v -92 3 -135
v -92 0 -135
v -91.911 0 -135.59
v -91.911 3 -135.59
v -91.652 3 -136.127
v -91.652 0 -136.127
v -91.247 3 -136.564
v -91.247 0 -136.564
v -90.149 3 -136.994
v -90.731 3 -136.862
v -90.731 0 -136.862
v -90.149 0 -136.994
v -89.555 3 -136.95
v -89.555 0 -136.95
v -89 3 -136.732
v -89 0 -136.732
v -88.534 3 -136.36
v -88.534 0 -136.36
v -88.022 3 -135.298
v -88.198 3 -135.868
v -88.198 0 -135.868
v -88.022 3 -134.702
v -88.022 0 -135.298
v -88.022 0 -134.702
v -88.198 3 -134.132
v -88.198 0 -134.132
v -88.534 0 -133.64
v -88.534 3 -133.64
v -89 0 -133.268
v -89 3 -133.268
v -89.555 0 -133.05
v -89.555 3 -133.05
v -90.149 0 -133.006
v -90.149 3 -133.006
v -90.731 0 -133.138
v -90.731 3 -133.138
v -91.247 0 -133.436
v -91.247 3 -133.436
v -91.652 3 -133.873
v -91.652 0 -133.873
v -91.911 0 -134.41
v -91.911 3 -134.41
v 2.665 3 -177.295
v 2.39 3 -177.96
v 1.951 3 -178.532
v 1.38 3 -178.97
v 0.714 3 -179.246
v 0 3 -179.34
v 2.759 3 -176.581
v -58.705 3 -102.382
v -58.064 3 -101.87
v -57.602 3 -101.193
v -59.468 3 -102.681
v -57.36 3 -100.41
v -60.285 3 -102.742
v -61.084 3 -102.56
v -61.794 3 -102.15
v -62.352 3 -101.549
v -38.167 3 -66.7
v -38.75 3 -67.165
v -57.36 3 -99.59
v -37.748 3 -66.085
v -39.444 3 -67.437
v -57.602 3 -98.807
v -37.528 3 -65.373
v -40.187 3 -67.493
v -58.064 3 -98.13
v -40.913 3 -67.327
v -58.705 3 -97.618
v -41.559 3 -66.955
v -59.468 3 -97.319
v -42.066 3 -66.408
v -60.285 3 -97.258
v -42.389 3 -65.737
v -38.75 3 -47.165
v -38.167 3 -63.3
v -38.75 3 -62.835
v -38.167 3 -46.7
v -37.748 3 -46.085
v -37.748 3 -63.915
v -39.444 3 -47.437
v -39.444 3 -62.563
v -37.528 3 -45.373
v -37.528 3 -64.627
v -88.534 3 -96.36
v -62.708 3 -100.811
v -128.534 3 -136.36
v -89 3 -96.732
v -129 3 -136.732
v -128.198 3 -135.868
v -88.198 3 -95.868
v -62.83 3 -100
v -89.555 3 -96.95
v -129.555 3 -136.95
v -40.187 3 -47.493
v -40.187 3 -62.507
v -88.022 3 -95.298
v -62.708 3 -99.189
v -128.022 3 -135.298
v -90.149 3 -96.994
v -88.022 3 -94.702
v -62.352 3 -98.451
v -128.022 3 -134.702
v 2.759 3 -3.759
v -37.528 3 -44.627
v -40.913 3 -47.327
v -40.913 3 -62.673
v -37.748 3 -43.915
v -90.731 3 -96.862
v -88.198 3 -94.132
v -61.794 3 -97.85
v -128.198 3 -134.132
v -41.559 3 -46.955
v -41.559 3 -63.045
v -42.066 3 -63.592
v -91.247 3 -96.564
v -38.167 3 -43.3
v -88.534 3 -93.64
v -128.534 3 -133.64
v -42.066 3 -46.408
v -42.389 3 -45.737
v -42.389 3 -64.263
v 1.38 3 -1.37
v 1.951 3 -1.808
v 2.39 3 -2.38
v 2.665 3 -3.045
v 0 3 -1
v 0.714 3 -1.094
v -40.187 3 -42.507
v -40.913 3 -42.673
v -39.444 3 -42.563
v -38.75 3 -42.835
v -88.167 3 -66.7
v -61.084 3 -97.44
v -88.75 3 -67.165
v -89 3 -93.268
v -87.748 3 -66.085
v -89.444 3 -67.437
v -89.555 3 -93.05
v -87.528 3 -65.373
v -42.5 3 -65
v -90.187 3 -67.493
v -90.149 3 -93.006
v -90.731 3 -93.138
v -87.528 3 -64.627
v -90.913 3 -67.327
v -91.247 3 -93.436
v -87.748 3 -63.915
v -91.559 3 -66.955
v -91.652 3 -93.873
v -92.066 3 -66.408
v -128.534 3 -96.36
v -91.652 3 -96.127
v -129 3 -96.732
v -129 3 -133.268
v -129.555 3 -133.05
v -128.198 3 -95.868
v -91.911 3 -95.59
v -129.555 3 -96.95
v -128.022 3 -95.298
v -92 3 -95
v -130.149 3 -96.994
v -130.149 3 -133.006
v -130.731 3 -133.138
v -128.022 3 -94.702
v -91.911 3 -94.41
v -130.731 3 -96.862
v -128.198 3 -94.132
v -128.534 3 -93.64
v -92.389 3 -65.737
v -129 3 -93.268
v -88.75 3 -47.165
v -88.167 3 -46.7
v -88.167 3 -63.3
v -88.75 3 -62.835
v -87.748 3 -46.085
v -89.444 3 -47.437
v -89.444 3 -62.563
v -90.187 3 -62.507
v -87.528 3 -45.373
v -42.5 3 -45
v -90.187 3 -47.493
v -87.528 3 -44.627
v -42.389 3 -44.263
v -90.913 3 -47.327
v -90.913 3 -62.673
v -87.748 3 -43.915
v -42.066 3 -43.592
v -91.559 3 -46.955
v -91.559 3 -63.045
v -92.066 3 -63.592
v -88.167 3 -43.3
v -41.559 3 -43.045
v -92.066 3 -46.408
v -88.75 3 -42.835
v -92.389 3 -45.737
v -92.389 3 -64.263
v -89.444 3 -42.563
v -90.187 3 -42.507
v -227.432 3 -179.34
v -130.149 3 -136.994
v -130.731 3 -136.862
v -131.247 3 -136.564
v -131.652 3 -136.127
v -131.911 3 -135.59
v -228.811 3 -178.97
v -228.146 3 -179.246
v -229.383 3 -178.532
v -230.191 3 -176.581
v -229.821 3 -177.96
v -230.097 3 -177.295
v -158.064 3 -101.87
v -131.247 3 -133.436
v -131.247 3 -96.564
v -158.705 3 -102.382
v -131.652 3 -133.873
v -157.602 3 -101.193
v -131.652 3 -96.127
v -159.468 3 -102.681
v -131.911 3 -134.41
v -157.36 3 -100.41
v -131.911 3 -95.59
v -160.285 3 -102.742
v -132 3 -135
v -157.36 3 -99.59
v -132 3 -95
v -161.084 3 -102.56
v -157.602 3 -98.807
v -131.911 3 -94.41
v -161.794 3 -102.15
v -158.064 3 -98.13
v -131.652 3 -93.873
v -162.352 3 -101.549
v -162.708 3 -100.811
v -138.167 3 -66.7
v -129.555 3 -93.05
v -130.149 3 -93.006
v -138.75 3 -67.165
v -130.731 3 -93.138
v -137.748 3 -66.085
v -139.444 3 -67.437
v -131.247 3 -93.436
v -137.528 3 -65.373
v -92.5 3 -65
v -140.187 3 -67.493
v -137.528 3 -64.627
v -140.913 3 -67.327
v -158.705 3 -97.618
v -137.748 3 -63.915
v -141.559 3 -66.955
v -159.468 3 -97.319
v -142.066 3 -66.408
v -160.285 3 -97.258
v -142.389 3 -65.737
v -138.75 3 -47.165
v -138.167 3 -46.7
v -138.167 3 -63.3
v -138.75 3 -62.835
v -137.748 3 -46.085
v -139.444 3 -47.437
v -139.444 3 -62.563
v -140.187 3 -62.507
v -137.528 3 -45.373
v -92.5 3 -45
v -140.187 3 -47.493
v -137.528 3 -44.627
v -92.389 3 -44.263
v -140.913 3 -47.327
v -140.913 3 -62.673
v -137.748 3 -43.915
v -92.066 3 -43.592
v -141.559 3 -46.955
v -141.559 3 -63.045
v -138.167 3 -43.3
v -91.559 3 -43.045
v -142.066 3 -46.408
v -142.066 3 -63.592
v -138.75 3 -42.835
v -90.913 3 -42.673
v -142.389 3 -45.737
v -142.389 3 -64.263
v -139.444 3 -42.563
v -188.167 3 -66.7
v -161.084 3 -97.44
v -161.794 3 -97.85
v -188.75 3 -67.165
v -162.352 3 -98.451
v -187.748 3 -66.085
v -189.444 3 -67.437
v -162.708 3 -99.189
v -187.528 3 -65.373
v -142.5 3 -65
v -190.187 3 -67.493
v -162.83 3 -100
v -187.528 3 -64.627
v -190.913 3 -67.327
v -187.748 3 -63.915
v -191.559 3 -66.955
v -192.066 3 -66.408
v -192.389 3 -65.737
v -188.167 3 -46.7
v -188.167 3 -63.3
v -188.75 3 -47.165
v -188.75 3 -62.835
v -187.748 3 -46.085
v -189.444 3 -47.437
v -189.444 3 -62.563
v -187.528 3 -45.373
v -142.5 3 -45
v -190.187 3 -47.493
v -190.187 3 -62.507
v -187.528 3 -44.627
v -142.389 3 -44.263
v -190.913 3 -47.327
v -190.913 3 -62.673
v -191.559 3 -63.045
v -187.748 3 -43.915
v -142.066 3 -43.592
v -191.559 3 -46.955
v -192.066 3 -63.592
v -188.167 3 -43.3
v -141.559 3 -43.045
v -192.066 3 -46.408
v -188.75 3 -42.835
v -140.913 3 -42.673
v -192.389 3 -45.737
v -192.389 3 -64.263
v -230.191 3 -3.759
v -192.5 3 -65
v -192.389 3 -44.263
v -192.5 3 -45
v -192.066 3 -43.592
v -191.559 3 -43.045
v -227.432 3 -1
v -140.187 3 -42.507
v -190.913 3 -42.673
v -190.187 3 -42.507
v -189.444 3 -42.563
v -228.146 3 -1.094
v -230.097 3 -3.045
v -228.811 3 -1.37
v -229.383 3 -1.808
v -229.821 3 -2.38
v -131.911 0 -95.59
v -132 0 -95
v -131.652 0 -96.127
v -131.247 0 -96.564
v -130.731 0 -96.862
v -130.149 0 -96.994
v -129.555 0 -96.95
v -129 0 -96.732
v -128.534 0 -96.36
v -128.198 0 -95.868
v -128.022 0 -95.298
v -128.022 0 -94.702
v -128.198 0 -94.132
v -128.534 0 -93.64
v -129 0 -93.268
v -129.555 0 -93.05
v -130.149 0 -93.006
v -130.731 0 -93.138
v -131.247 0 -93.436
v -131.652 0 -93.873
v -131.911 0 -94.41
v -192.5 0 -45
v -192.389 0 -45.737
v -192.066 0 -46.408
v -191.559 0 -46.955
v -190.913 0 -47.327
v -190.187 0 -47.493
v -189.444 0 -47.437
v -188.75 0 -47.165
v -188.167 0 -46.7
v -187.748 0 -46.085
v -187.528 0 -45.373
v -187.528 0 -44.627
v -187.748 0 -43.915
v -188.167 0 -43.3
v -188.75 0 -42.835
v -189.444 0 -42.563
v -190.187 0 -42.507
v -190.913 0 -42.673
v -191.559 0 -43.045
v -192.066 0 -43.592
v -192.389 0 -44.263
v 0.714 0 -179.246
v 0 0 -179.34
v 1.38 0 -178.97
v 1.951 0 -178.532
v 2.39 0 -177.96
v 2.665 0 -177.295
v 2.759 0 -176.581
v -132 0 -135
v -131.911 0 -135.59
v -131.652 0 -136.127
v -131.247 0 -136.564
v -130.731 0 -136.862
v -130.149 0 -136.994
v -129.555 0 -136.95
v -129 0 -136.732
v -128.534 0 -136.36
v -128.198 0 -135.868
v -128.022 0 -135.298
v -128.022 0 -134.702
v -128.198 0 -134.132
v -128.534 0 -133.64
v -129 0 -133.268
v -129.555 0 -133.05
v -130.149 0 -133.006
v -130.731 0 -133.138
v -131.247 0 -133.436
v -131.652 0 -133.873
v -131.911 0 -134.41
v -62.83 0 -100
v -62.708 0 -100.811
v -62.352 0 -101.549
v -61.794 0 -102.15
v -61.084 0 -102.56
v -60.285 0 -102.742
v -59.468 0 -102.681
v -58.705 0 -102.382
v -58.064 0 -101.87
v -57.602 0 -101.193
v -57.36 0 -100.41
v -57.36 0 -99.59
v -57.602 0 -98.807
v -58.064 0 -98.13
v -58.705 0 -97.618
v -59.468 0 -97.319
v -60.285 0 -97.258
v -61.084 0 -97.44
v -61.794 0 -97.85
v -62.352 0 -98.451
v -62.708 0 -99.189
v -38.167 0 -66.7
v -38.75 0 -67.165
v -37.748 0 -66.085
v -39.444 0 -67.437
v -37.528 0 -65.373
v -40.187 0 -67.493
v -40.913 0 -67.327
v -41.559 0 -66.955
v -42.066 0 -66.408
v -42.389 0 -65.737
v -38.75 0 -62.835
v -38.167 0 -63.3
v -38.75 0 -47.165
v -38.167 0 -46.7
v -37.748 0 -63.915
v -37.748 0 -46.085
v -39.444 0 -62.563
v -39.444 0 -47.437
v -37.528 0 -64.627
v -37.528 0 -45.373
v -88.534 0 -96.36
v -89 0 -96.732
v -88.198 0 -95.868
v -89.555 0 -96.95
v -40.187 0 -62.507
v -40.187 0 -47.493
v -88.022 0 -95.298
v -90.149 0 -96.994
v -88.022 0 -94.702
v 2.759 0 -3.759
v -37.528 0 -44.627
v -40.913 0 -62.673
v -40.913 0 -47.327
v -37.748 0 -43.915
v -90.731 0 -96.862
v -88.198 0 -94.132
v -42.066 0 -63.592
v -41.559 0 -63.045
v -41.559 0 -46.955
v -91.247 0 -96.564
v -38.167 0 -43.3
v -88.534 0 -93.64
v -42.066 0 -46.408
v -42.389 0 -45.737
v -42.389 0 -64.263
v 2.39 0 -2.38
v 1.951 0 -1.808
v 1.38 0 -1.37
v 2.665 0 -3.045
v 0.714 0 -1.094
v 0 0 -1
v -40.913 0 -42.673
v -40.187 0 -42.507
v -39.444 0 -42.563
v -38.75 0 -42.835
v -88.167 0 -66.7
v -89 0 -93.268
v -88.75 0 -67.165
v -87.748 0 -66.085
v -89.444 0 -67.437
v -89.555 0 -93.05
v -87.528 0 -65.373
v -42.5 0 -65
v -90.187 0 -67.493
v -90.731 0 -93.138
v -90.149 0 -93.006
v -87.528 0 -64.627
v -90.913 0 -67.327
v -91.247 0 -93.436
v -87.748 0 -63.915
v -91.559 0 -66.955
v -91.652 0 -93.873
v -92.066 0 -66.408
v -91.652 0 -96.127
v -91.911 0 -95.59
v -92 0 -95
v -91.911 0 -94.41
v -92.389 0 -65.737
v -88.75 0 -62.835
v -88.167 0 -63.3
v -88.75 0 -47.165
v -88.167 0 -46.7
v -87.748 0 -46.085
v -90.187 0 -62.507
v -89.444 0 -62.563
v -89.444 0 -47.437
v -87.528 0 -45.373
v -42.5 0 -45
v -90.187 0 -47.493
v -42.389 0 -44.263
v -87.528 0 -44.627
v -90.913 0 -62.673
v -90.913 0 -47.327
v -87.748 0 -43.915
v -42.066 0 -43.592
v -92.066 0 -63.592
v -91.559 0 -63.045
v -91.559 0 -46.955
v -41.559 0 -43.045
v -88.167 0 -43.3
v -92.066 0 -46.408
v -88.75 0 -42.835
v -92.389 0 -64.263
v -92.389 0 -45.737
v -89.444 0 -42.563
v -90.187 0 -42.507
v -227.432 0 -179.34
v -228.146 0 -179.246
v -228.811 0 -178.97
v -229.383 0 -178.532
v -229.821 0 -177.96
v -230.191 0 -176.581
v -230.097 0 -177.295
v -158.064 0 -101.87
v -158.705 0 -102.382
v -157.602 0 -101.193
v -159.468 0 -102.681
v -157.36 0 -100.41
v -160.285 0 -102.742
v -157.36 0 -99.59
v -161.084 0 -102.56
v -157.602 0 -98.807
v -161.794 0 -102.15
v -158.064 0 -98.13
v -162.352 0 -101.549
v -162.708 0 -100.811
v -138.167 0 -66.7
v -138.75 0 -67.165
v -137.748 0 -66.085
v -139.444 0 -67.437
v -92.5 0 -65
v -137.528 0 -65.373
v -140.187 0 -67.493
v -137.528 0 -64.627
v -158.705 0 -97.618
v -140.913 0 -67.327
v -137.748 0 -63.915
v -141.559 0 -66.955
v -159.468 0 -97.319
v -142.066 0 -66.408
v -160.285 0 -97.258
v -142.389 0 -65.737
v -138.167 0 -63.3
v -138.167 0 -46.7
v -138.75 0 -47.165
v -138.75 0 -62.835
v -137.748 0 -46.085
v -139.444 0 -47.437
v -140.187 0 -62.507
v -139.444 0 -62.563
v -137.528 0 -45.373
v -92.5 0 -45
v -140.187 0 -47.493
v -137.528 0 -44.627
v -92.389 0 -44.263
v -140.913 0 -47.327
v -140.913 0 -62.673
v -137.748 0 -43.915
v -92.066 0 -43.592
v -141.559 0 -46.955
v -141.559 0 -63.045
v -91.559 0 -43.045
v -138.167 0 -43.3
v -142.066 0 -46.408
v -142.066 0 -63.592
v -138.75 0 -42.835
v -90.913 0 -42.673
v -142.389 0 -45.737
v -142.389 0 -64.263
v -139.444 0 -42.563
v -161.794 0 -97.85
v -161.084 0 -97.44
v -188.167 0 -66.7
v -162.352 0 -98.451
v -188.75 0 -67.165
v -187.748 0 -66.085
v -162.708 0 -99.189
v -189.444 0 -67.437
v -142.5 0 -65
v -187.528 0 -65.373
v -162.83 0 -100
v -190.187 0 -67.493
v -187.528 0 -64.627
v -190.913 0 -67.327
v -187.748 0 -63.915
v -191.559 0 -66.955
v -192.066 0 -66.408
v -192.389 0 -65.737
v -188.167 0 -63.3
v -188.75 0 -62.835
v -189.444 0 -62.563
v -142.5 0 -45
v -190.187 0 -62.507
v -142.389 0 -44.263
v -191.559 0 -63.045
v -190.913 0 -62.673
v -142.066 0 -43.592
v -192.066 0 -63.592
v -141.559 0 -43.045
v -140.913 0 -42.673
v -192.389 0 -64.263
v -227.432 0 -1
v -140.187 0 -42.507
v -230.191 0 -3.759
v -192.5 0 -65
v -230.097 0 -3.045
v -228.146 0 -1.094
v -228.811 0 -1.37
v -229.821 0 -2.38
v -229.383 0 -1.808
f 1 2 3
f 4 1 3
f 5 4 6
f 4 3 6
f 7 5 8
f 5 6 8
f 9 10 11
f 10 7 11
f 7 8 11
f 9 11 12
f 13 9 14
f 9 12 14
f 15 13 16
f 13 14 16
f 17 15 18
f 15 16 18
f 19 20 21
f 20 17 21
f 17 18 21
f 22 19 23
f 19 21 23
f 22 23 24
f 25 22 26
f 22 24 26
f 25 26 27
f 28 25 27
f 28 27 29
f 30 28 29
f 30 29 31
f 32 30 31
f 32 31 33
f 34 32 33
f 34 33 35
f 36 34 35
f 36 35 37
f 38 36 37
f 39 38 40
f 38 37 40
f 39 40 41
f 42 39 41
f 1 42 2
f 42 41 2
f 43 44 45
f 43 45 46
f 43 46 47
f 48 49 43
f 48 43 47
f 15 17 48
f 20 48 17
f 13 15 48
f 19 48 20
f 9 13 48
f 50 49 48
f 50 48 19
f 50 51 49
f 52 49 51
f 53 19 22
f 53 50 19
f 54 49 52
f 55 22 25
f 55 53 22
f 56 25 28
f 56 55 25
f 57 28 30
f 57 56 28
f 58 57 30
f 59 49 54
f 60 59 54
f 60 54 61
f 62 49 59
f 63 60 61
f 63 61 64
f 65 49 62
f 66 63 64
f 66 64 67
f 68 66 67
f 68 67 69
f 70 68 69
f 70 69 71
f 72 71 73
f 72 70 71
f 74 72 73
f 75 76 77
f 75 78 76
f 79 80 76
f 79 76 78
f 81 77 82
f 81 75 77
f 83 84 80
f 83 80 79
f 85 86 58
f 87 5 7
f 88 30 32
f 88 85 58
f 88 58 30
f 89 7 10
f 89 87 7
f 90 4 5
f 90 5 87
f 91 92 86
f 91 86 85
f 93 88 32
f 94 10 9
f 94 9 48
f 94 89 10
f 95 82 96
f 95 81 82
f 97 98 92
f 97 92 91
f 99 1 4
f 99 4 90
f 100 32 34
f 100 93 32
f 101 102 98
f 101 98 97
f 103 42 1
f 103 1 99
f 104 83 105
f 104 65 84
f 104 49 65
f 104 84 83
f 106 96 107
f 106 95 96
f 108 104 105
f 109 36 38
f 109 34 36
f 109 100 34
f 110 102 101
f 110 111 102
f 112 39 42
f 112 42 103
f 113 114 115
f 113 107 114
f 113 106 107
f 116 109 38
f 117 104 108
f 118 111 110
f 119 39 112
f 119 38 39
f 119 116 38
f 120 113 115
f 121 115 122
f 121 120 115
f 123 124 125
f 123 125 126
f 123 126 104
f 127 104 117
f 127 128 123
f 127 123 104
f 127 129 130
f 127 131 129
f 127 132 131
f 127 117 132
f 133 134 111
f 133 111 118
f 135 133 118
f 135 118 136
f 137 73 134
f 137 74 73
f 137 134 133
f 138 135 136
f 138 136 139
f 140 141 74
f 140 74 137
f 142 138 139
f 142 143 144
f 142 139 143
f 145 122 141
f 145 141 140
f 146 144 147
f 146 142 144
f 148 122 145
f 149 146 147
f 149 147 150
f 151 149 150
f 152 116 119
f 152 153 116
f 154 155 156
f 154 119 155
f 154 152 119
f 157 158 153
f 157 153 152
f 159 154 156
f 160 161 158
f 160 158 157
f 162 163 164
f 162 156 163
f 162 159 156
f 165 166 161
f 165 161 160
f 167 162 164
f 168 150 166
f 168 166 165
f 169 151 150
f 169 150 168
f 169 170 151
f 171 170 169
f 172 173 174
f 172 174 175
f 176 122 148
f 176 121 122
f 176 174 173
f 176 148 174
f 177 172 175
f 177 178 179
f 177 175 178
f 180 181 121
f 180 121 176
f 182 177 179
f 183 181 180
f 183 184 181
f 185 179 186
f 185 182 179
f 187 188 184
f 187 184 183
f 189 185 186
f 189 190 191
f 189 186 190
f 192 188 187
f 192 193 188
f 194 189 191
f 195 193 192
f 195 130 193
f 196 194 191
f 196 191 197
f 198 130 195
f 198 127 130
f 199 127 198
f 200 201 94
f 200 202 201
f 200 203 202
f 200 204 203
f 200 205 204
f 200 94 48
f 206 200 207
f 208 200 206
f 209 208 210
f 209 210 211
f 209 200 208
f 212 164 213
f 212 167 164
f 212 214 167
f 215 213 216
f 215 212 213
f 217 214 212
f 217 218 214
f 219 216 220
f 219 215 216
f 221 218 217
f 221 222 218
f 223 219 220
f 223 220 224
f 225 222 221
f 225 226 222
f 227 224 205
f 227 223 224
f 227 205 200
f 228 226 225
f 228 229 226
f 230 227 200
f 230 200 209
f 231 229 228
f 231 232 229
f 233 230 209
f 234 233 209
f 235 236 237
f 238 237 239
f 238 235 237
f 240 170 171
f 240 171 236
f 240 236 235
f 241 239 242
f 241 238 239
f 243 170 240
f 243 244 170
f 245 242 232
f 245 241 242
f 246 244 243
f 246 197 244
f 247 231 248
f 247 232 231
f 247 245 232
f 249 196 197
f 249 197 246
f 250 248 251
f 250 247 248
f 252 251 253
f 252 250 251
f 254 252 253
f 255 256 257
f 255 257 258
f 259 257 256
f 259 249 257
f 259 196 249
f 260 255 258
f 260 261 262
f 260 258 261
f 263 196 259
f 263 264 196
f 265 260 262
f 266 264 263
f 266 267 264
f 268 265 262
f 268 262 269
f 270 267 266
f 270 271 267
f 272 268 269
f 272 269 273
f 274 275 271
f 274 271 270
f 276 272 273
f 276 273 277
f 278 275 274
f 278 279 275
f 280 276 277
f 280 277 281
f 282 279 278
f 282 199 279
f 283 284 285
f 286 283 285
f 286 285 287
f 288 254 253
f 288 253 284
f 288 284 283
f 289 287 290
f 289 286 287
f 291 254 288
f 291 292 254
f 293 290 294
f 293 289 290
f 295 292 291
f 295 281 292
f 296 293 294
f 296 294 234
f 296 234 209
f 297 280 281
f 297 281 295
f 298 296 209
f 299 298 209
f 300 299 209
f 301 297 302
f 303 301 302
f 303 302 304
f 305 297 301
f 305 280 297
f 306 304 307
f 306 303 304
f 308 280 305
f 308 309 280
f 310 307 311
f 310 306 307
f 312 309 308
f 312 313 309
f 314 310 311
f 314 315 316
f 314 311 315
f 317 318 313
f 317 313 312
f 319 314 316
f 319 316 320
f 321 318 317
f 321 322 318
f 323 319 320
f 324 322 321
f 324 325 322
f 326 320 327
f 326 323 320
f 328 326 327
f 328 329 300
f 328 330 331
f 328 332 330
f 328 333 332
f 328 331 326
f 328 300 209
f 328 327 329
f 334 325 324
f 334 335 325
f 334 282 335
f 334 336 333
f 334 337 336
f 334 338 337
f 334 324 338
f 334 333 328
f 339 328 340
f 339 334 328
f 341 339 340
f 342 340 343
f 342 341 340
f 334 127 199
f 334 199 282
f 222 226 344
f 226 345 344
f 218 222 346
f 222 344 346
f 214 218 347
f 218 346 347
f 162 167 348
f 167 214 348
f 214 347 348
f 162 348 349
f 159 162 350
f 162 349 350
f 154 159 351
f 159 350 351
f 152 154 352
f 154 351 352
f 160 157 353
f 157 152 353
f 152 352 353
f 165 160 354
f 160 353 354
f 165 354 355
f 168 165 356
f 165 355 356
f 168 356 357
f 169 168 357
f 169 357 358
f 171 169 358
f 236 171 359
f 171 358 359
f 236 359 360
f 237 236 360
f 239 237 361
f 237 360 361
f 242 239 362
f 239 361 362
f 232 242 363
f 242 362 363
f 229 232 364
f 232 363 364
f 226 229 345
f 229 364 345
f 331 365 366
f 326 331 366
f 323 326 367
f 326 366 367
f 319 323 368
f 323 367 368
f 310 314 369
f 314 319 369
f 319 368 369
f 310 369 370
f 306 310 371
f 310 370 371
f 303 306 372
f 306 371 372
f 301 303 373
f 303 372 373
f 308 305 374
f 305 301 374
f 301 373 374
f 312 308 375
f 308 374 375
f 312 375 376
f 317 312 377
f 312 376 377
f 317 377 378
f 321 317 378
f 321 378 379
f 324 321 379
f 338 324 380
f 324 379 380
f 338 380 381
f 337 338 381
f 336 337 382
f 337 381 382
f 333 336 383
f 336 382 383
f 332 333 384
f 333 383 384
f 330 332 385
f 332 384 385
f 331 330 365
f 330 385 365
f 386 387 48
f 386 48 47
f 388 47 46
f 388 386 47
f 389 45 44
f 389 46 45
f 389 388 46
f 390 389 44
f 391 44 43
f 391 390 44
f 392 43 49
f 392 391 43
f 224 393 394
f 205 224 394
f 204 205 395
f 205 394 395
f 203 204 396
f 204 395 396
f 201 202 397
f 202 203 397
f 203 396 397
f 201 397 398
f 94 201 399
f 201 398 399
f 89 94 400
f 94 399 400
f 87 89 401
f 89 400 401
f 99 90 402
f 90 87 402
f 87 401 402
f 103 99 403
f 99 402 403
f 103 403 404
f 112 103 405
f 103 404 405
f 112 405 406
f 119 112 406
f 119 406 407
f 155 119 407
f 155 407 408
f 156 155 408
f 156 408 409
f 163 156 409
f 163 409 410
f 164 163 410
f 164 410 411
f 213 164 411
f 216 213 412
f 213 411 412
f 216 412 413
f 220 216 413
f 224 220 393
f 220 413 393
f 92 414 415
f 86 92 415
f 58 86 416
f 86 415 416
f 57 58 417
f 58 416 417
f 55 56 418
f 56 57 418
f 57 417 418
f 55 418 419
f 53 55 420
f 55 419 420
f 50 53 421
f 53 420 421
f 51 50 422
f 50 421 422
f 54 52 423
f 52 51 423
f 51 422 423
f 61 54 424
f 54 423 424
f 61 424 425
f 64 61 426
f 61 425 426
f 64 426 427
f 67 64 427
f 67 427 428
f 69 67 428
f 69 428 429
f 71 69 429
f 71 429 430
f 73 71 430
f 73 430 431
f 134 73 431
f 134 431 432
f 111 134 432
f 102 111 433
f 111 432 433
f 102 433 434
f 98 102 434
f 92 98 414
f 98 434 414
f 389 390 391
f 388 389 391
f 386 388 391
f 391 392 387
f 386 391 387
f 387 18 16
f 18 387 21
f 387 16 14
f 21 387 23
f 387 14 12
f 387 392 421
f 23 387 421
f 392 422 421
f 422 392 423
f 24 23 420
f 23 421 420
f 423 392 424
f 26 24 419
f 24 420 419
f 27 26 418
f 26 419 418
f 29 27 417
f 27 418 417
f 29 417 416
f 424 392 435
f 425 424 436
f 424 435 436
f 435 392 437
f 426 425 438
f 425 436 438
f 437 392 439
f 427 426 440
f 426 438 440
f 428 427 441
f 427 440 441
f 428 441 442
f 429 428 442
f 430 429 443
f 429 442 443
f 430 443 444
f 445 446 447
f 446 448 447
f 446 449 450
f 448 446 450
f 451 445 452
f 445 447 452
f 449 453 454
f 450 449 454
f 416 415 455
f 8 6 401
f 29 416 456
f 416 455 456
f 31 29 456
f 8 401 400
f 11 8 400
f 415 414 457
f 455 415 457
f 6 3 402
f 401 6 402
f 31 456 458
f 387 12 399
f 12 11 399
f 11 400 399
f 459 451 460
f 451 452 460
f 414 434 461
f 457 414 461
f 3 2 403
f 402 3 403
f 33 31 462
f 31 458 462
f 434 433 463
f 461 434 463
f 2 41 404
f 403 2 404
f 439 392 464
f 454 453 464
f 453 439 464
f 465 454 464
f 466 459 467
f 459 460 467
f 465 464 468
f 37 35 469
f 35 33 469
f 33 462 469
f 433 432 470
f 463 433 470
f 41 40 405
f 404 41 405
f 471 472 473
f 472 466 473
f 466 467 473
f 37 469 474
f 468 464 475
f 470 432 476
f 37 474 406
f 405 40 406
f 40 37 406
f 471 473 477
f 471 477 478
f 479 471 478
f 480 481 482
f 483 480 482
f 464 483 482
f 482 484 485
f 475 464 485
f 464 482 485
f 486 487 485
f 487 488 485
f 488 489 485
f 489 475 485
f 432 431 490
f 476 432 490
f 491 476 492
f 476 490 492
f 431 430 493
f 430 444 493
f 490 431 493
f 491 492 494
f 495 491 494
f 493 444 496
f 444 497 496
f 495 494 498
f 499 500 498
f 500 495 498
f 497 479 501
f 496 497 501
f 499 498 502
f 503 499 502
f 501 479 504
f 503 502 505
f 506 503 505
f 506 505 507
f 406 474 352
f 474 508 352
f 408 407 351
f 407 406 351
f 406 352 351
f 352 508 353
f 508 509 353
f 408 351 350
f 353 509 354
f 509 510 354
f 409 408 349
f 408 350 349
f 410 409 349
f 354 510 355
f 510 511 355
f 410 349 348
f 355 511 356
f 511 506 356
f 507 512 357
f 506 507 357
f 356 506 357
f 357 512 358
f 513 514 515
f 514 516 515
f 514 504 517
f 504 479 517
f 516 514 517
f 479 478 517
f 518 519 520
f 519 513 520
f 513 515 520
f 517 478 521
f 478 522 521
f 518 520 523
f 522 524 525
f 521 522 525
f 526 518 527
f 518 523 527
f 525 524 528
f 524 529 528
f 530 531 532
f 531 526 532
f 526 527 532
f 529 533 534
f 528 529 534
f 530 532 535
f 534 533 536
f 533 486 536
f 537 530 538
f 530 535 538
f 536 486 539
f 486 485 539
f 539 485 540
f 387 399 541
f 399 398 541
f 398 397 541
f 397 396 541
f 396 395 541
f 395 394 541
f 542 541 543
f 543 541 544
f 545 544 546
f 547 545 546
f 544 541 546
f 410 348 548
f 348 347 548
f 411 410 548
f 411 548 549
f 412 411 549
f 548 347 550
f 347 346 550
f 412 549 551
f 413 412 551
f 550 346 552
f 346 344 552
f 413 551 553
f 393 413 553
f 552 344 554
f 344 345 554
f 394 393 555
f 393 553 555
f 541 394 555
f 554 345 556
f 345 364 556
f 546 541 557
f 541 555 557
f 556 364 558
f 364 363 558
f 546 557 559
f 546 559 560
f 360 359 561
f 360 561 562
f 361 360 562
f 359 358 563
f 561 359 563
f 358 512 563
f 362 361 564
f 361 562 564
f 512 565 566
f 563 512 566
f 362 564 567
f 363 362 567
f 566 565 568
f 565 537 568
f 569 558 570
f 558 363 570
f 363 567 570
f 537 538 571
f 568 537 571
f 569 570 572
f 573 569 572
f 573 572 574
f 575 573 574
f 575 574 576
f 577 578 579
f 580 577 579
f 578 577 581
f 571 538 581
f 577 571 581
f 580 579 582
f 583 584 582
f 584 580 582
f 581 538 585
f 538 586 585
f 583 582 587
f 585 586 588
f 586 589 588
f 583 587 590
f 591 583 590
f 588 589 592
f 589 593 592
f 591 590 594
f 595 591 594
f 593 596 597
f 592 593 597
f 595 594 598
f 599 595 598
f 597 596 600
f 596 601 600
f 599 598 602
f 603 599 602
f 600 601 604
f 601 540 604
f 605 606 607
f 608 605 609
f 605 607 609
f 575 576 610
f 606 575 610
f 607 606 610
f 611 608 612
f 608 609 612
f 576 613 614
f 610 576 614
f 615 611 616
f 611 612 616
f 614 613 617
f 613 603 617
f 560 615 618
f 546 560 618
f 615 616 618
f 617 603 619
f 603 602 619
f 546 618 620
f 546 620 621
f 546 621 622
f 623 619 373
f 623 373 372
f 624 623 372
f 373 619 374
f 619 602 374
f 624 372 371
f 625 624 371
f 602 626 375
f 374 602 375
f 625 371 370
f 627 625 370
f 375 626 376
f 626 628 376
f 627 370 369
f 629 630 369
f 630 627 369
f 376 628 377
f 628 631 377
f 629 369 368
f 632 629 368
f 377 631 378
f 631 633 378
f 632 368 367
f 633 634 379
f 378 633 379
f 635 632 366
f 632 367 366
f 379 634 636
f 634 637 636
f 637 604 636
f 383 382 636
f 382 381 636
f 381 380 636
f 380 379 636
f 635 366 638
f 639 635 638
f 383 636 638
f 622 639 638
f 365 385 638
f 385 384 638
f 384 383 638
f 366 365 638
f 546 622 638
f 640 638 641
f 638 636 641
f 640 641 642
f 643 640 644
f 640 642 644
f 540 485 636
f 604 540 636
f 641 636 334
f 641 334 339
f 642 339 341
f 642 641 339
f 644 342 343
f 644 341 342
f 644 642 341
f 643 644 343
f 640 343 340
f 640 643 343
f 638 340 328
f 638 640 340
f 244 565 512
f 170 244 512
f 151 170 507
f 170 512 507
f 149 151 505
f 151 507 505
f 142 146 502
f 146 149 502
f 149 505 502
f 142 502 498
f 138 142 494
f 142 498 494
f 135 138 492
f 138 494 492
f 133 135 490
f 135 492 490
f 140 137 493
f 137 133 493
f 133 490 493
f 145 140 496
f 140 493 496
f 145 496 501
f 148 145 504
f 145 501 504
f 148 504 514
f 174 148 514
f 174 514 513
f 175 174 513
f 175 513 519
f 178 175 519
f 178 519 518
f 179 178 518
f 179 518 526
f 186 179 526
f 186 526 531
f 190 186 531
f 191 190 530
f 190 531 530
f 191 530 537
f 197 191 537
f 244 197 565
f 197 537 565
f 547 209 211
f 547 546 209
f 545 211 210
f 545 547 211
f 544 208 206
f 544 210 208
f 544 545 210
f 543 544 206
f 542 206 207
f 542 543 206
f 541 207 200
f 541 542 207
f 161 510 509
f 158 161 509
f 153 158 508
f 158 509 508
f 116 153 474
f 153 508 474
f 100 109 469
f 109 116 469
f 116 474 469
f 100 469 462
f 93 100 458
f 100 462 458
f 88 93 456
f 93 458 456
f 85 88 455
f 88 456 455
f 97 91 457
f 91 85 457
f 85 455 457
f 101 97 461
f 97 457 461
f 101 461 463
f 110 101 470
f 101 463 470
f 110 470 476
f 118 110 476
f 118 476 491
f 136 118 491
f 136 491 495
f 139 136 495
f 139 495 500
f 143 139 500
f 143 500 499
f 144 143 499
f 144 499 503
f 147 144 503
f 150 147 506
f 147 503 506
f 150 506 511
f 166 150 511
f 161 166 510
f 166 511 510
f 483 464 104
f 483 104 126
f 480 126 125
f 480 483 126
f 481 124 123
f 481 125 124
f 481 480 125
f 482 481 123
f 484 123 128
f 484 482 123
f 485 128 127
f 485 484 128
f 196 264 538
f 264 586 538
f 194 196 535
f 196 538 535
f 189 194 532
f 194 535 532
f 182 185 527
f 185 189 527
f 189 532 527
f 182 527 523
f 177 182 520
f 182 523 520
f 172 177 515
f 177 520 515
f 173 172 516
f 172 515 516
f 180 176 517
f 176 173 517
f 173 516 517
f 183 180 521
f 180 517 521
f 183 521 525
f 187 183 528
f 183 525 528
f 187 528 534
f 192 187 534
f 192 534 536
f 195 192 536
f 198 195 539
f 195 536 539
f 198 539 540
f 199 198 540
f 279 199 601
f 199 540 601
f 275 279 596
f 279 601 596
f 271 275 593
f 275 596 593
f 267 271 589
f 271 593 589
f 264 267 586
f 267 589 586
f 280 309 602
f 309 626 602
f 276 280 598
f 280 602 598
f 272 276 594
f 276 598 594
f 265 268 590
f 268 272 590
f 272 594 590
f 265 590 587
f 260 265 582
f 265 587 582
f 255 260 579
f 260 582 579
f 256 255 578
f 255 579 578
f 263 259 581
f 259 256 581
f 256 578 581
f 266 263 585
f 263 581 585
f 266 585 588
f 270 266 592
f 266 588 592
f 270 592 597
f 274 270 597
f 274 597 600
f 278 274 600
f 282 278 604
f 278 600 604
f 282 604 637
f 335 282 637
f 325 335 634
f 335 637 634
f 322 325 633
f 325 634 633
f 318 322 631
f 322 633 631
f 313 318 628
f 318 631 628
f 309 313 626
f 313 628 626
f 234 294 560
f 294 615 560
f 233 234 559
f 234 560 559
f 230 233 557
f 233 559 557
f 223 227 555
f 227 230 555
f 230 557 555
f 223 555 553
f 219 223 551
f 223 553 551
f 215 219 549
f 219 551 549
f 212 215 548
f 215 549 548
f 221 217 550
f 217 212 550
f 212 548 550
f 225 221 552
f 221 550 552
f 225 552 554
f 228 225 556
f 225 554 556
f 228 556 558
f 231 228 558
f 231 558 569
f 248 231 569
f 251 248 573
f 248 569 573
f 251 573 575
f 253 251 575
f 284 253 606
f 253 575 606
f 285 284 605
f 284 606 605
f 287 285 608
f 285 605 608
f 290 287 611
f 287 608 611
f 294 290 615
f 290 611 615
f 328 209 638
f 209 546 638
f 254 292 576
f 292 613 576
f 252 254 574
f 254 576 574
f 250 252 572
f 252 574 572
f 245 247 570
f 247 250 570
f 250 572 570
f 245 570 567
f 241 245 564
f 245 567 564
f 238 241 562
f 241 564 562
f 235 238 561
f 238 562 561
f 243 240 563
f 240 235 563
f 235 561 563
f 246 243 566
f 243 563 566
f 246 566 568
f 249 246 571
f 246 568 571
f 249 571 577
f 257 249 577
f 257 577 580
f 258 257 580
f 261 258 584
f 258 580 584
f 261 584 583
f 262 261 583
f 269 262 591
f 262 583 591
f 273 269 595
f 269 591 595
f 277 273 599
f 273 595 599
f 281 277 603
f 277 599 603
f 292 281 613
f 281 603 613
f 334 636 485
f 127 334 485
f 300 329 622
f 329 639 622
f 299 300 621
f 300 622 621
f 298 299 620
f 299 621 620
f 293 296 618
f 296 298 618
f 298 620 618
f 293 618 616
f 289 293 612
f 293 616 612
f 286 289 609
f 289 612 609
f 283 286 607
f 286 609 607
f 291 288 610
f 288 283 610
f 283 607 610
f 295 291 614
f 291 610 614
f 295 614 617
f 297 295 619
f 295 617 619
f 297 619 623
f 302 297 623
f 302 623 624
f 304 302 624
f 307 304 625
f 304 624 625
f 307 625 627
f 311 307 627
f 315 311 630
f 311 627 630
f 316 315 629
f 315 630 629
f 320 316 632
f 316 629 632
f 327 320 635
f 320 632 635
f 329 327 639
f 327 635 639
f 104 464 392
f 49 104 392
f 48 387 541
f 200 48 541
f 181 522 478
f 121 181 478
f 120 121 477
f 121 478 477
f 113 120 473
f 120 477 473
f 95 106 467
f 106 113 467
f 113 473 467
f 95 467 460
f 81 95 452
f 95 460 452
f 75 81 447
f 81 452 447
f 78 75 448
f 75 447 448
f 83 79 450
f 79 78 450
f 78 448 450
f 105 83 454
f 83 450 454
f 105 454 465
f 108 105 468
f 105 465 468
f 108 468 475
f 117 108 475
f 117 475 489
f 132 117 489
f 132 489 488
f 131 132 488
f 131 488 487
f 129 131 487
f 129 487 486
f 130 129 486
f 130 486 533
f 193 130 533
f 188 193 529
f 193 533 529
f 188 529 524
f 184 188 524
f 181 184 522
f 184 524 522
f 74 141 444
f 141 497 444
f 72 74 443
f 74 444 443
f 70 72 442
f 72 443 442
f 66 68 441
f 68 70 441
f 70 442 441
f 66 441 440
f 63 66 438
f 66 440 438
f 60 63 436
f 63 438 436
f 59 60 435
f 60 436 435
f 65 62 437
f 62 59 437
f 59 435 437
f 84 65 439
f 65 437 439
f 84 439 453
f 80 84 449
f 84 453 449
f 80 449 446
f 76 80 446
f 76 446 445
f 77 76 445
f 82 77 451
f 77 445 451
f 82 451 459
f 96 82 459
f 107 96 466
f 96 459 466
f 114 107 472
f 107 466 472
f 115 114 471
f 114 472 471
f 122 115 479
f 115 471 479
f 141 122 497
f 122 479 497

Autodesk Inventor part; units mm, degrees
ref_plane "YZ Plane" through (0, 0, 0) normal (1, 0, 0) x (0, 1, 0)
ref_plane "XZ Plane" through (0, 0, 0) normal (0, 1, 0) x (-1, 0, 0)
ref_plane "XY Plane" through (0, 0, 0) normal (0, 0, 1) x (1, 0, 0)
sketch "Sketch1" plane through (0, 0, 0) normal (0, 1, 0) x (-1, 0, 0)
  line L0 (232.1908, -176.5808) -> (232.1908, -3.7592)
  arc A0 (232.1908, -3.7592) -> (227.4316, 1) centre (227.4316, -3.7592) ccw
  line L1 (227.4316, 1) -> (0, 1)
  arc A1 (0, 1) -> (-4.7592, -3.7592) centre (0, -3.7592) ccw
  arc A2 (-4.7592, -176.5808) -> (0, -181.34) centre (0, -176.5808) ccw
  arc A3 (227.4316, -181.34) -> (232.1908, -176.5808) centre (227.4316, -176.5808) ccw
  circle A4 centre (130, -135) radius 2
  circle A5 centre (130, -95) radius 2
  circle A6 centre (90, -135) radius 2
  circle A7 centre (90, -95) radius 2
  circle A8 centre (160.0797, -100) radius 2.75
  circle A9 centre (60.0797, -100) radius 2.75
  circle A10 centre (90, -45) radius 2.5
  circle A11 centre (190, -45) radius 2.5
  circle A12 centre (190, -65) radius 2.5
  circle A13 centre (90, -65) radius 2.5
  circle A14 centre (140, -45) radius 2.5
  circle A15 centre (40, -45) radius 2.5
  circle A16 centre (140, -65) radius 2.5
  circle A17 centre (40, -65) radius 2.5
  line L2 (230.1908, -176.5808) -> (230.1908, -3.7592)
  arc A18 (230.1908, -3.7592) -> (227.4316, -1) centre (227.4316, -3.7592) ccw
  line L3 (227.4316, -1) -> (0, -1)
  arc A19 (0, -1) -> (-2.7592, -3.7592) centre (0, -3.7592) ccw
  arc A20 (-2.7592, -176.5808) -> (0, -179.34) centre (0, -176.5808) ccw
  arc A21 (227.4316, -179.34) -> (230.1908, -176.5808) centre (227.4316, -176.5808) ccw
  line L4 (-4.7592, -3.7592) -> (-4.7592, -176.5808)
  line L5 (-2.7592, -3.7592) -> (-2.7592, -176.5808)
  line L6 (0, -179.34) -> (227.4316, -179.34)
  line L7 (227.4316, -181.34) -> (0, -181.34)
  point P0 (0, 0)
  point P1 (230.1908, -3.7592)
  point P2 (0, -1)
  dimension "d0" = 2
  dimension "d1" = 2
  dimension "d2" = 2
  dimension "d3" = 2
  dimension "d5" = 2
  dimension "d7" = 2
  dimension "d8" = 227.4316
  dimension "d9" = 172.8216
  dimension "d10" = 4.7592
extrude "Extrusion1" add sketch "Sketch1" along normal blind 3 contours A21 L6 A20 L5 A19 L3 A18 L2
sketch "Sketch2" plane through (0, 3, 0) normal (0, 1, 0) x (1, 0, 0)
  line L0 (-232.1908, 176.5808) -> (-232.1908, 3.7592)
  arc A0 (-232.1908, 3.7592) -> (-227.4316, -1) centre (-227.4316, 3.7592) ccw
  line L1 (-227.4316, -1) -> (0, -1)
  arc A1 (0, -1) -> (4.7592, 3.7592) centre (0, 3.7592) ccw
  arc A2 (4.7592, 176.5808) -> (0, 181.34) centre (0, 176.5808) ccw
  arc A3 (-227.4316, 181.34) -> (-232.1908, 176.5808) centre (-227.4316, 176.5808) ccw
  circle A4 centre (-130, 135) radius 2
  circle A5 centre (-130, 95) radius 2
  circle A6 centre (-90, 135) radius 2
  circle A7 centre (-90, 95) radius 2
  circle A8 centre (-160.0797, 100) radius 2.75
  circle A9 centre (-60.0797, 100) radius 2.75
  circle A10 centre (-90, 45) radius 2.5
  circle A11 centre (-190, 45) radius 2.5
  circle A12 centre (-190, 65) radius 2.5
  circle A13 centre (-90, 65) radius 2.5
  circle A14 centre (-140, 45) radius 2.5
  circle A15 centre (-40, 45) radius 2.5
  circle A16 centre (-140, 65) radius 2.5
  circle A17 centre (-40, 65) radius 2.5
  line L2 (-230.1908, 176.5808) -> (-230.1908, 3.7592)
  arc A18 (-230.1908, 3.7592) -> (-227.4316, 1) centre (-227.4316, 3.7592) ccw
  line L3 (-227.4316, 1) -> (0, 1)
  arc A19 (0, 1) -> (2.7592, 3.7592) centre (0, 3.7592) ccw
  arc A20 (2.7592, 176.5808) -> (0, 179.34) centre (0, 176.5808) ccw
  arc A21 (-227.4316, 179.34) -> (-230.1908, 176.5808) centre (-227.4316, 176.5808) ccw
  line L4 (4.7592, 3.7592) -> (4.7592, 176.5808)
  line L5 (2.7592, 3.7592) -> (2.7592, 176.5808)
  line L6 (0, 179.34) -> (-227.4316, 179.34)
  line L7 (-227.4316, 181.34) -> (0, 181.34)
  line L8 (0, 179.34) -> (-227.4316, 179.34) projected
  line L9 (-113.7158, 179.34) -> (-113.7158, 1)
  line L10 (-227.4316, 1) -> (0, 1) projected
  line L11 (-118.7158, 120.17) -> (-108.7158, 120.17)
  line L12 (-108.7158, 120.17) -> (-108.7158, 60.17)
  line L13 (-108.7158, 60.17) -> (-118.7158, 60.17)
  line L14 (-118.7158, 60.17) -> (-118.7158, 120.17)
  line L15 (-118.7158, 120.17) -> (-108.7158, 60.17) construction
  line L16 (-108.7158, 120.17) -> (-118.7158, 60.17) construction
  line L17 (-113.7158, 179.34) -> (-113.7158, 159.34)
  line L18 (2.7592, 139.34) -> (-230.1908, 139.34)
  line L19 (-230.1908, 139.34) -> (-230.1908, 179.34)
  line L20 (-230.1908, 179.34) -> (2.7592, 179.34)
  line L21 (2.7592, 179.34) -> (2.7592, 139.34)
  line L22 (2.7592, 139.34) -> (-230.1908, 179.34) construction
  line L23 (-230.1908, 139.34) -> (2.7592, 179.34) construction
  line L24 (-113.7158, 1) -> (-113.7158, 16)
  line L25 (-230.1908, 31) -> (2.7592, 31)
  line L26 (2.7592, 31) -> (2.7592, 1)
  line L27 (2.7592, 1) -> (-230.1908, 1)
  line L28 (-230.1908, 1) -> (-230.1908, 31)
  line L29 (-230.1908, 31) -> (2.7592, 1) construction
  line L30 (2.7592, 31) -> (-230.1908, 1) construction
  line L31 (-227.4316, 1) -> (0, 1) projected
  line L32 (-230.1908, 179.34) -> (-200.1908, 179.34)
  line L33 (-200.1908, 179.34) -> (-200.1908, 1)
  line L34 (-200.1908, 1) -> (-230.1908, 1)
  line L35 (-230.1908, 1) -> (-230.1908, 179.34)
  line L36 (2.7592, 1) -> (-27.2408, 1)
  line L37 (-27.2408, 1) -> (-27.2408, 179.34)
  line L38 (-27.2408, 179.34) -> (2.7592, 179.34)
  line L39 (2.7592, 179.34) -> (2.7592, 1)
  point P0 (230.1908, -176.5808)
  point P1 (230.1908, -3.7592)
  point P2 (227.4316, -1)
  point P3 (0, -1)
  point P4 (0, 0)
  point P5 (230.1908, -176.5808)
  point P6 (230.1908, -3.7592)
  point P7 (227.4316, -1)
  point P8 (0, -1)
  point P9 (-113.7158, 90.17)
  point P10 (-113.7158, 120.17)
  point P11 (-113.7158, 60.17)
  point P12 (-113.7158, 1)
  point P13 (0, 1)
  dimension "d22" = 2
  dimension "d23" = 2
  dimension "d24" = 2
  dimension "d25" = 2
  dimension "d26" = 2
  dimension "d27" = 2
  dimension "d28" = 227.4316
  dimension "d29" = 172.8216
  dimension "d30" = 4.7592
  dimension "d31" = 10
  dimension "d32" = 60
  dimension "d37" = 20
  dimension "d38" = 40
  dimension "d39" = 15
  dimension "d40" = 30
  dimension "d41" = 30
  dimension "d42" = 30
equation "\"d1\" = d0"
equation "\"d2\" = d0"
equation "\"d3\" = d0"
equation "\"d5\" = d0"
equation "\"d7\" = d0"
equation "\"d23\" = d22"
equation "\"d24\" = d22"
equation "\"d25\" = d22"
equation "\"d26\" = d22"
equation "\"d27\" = d22"
properties part number "EboxBottom"
